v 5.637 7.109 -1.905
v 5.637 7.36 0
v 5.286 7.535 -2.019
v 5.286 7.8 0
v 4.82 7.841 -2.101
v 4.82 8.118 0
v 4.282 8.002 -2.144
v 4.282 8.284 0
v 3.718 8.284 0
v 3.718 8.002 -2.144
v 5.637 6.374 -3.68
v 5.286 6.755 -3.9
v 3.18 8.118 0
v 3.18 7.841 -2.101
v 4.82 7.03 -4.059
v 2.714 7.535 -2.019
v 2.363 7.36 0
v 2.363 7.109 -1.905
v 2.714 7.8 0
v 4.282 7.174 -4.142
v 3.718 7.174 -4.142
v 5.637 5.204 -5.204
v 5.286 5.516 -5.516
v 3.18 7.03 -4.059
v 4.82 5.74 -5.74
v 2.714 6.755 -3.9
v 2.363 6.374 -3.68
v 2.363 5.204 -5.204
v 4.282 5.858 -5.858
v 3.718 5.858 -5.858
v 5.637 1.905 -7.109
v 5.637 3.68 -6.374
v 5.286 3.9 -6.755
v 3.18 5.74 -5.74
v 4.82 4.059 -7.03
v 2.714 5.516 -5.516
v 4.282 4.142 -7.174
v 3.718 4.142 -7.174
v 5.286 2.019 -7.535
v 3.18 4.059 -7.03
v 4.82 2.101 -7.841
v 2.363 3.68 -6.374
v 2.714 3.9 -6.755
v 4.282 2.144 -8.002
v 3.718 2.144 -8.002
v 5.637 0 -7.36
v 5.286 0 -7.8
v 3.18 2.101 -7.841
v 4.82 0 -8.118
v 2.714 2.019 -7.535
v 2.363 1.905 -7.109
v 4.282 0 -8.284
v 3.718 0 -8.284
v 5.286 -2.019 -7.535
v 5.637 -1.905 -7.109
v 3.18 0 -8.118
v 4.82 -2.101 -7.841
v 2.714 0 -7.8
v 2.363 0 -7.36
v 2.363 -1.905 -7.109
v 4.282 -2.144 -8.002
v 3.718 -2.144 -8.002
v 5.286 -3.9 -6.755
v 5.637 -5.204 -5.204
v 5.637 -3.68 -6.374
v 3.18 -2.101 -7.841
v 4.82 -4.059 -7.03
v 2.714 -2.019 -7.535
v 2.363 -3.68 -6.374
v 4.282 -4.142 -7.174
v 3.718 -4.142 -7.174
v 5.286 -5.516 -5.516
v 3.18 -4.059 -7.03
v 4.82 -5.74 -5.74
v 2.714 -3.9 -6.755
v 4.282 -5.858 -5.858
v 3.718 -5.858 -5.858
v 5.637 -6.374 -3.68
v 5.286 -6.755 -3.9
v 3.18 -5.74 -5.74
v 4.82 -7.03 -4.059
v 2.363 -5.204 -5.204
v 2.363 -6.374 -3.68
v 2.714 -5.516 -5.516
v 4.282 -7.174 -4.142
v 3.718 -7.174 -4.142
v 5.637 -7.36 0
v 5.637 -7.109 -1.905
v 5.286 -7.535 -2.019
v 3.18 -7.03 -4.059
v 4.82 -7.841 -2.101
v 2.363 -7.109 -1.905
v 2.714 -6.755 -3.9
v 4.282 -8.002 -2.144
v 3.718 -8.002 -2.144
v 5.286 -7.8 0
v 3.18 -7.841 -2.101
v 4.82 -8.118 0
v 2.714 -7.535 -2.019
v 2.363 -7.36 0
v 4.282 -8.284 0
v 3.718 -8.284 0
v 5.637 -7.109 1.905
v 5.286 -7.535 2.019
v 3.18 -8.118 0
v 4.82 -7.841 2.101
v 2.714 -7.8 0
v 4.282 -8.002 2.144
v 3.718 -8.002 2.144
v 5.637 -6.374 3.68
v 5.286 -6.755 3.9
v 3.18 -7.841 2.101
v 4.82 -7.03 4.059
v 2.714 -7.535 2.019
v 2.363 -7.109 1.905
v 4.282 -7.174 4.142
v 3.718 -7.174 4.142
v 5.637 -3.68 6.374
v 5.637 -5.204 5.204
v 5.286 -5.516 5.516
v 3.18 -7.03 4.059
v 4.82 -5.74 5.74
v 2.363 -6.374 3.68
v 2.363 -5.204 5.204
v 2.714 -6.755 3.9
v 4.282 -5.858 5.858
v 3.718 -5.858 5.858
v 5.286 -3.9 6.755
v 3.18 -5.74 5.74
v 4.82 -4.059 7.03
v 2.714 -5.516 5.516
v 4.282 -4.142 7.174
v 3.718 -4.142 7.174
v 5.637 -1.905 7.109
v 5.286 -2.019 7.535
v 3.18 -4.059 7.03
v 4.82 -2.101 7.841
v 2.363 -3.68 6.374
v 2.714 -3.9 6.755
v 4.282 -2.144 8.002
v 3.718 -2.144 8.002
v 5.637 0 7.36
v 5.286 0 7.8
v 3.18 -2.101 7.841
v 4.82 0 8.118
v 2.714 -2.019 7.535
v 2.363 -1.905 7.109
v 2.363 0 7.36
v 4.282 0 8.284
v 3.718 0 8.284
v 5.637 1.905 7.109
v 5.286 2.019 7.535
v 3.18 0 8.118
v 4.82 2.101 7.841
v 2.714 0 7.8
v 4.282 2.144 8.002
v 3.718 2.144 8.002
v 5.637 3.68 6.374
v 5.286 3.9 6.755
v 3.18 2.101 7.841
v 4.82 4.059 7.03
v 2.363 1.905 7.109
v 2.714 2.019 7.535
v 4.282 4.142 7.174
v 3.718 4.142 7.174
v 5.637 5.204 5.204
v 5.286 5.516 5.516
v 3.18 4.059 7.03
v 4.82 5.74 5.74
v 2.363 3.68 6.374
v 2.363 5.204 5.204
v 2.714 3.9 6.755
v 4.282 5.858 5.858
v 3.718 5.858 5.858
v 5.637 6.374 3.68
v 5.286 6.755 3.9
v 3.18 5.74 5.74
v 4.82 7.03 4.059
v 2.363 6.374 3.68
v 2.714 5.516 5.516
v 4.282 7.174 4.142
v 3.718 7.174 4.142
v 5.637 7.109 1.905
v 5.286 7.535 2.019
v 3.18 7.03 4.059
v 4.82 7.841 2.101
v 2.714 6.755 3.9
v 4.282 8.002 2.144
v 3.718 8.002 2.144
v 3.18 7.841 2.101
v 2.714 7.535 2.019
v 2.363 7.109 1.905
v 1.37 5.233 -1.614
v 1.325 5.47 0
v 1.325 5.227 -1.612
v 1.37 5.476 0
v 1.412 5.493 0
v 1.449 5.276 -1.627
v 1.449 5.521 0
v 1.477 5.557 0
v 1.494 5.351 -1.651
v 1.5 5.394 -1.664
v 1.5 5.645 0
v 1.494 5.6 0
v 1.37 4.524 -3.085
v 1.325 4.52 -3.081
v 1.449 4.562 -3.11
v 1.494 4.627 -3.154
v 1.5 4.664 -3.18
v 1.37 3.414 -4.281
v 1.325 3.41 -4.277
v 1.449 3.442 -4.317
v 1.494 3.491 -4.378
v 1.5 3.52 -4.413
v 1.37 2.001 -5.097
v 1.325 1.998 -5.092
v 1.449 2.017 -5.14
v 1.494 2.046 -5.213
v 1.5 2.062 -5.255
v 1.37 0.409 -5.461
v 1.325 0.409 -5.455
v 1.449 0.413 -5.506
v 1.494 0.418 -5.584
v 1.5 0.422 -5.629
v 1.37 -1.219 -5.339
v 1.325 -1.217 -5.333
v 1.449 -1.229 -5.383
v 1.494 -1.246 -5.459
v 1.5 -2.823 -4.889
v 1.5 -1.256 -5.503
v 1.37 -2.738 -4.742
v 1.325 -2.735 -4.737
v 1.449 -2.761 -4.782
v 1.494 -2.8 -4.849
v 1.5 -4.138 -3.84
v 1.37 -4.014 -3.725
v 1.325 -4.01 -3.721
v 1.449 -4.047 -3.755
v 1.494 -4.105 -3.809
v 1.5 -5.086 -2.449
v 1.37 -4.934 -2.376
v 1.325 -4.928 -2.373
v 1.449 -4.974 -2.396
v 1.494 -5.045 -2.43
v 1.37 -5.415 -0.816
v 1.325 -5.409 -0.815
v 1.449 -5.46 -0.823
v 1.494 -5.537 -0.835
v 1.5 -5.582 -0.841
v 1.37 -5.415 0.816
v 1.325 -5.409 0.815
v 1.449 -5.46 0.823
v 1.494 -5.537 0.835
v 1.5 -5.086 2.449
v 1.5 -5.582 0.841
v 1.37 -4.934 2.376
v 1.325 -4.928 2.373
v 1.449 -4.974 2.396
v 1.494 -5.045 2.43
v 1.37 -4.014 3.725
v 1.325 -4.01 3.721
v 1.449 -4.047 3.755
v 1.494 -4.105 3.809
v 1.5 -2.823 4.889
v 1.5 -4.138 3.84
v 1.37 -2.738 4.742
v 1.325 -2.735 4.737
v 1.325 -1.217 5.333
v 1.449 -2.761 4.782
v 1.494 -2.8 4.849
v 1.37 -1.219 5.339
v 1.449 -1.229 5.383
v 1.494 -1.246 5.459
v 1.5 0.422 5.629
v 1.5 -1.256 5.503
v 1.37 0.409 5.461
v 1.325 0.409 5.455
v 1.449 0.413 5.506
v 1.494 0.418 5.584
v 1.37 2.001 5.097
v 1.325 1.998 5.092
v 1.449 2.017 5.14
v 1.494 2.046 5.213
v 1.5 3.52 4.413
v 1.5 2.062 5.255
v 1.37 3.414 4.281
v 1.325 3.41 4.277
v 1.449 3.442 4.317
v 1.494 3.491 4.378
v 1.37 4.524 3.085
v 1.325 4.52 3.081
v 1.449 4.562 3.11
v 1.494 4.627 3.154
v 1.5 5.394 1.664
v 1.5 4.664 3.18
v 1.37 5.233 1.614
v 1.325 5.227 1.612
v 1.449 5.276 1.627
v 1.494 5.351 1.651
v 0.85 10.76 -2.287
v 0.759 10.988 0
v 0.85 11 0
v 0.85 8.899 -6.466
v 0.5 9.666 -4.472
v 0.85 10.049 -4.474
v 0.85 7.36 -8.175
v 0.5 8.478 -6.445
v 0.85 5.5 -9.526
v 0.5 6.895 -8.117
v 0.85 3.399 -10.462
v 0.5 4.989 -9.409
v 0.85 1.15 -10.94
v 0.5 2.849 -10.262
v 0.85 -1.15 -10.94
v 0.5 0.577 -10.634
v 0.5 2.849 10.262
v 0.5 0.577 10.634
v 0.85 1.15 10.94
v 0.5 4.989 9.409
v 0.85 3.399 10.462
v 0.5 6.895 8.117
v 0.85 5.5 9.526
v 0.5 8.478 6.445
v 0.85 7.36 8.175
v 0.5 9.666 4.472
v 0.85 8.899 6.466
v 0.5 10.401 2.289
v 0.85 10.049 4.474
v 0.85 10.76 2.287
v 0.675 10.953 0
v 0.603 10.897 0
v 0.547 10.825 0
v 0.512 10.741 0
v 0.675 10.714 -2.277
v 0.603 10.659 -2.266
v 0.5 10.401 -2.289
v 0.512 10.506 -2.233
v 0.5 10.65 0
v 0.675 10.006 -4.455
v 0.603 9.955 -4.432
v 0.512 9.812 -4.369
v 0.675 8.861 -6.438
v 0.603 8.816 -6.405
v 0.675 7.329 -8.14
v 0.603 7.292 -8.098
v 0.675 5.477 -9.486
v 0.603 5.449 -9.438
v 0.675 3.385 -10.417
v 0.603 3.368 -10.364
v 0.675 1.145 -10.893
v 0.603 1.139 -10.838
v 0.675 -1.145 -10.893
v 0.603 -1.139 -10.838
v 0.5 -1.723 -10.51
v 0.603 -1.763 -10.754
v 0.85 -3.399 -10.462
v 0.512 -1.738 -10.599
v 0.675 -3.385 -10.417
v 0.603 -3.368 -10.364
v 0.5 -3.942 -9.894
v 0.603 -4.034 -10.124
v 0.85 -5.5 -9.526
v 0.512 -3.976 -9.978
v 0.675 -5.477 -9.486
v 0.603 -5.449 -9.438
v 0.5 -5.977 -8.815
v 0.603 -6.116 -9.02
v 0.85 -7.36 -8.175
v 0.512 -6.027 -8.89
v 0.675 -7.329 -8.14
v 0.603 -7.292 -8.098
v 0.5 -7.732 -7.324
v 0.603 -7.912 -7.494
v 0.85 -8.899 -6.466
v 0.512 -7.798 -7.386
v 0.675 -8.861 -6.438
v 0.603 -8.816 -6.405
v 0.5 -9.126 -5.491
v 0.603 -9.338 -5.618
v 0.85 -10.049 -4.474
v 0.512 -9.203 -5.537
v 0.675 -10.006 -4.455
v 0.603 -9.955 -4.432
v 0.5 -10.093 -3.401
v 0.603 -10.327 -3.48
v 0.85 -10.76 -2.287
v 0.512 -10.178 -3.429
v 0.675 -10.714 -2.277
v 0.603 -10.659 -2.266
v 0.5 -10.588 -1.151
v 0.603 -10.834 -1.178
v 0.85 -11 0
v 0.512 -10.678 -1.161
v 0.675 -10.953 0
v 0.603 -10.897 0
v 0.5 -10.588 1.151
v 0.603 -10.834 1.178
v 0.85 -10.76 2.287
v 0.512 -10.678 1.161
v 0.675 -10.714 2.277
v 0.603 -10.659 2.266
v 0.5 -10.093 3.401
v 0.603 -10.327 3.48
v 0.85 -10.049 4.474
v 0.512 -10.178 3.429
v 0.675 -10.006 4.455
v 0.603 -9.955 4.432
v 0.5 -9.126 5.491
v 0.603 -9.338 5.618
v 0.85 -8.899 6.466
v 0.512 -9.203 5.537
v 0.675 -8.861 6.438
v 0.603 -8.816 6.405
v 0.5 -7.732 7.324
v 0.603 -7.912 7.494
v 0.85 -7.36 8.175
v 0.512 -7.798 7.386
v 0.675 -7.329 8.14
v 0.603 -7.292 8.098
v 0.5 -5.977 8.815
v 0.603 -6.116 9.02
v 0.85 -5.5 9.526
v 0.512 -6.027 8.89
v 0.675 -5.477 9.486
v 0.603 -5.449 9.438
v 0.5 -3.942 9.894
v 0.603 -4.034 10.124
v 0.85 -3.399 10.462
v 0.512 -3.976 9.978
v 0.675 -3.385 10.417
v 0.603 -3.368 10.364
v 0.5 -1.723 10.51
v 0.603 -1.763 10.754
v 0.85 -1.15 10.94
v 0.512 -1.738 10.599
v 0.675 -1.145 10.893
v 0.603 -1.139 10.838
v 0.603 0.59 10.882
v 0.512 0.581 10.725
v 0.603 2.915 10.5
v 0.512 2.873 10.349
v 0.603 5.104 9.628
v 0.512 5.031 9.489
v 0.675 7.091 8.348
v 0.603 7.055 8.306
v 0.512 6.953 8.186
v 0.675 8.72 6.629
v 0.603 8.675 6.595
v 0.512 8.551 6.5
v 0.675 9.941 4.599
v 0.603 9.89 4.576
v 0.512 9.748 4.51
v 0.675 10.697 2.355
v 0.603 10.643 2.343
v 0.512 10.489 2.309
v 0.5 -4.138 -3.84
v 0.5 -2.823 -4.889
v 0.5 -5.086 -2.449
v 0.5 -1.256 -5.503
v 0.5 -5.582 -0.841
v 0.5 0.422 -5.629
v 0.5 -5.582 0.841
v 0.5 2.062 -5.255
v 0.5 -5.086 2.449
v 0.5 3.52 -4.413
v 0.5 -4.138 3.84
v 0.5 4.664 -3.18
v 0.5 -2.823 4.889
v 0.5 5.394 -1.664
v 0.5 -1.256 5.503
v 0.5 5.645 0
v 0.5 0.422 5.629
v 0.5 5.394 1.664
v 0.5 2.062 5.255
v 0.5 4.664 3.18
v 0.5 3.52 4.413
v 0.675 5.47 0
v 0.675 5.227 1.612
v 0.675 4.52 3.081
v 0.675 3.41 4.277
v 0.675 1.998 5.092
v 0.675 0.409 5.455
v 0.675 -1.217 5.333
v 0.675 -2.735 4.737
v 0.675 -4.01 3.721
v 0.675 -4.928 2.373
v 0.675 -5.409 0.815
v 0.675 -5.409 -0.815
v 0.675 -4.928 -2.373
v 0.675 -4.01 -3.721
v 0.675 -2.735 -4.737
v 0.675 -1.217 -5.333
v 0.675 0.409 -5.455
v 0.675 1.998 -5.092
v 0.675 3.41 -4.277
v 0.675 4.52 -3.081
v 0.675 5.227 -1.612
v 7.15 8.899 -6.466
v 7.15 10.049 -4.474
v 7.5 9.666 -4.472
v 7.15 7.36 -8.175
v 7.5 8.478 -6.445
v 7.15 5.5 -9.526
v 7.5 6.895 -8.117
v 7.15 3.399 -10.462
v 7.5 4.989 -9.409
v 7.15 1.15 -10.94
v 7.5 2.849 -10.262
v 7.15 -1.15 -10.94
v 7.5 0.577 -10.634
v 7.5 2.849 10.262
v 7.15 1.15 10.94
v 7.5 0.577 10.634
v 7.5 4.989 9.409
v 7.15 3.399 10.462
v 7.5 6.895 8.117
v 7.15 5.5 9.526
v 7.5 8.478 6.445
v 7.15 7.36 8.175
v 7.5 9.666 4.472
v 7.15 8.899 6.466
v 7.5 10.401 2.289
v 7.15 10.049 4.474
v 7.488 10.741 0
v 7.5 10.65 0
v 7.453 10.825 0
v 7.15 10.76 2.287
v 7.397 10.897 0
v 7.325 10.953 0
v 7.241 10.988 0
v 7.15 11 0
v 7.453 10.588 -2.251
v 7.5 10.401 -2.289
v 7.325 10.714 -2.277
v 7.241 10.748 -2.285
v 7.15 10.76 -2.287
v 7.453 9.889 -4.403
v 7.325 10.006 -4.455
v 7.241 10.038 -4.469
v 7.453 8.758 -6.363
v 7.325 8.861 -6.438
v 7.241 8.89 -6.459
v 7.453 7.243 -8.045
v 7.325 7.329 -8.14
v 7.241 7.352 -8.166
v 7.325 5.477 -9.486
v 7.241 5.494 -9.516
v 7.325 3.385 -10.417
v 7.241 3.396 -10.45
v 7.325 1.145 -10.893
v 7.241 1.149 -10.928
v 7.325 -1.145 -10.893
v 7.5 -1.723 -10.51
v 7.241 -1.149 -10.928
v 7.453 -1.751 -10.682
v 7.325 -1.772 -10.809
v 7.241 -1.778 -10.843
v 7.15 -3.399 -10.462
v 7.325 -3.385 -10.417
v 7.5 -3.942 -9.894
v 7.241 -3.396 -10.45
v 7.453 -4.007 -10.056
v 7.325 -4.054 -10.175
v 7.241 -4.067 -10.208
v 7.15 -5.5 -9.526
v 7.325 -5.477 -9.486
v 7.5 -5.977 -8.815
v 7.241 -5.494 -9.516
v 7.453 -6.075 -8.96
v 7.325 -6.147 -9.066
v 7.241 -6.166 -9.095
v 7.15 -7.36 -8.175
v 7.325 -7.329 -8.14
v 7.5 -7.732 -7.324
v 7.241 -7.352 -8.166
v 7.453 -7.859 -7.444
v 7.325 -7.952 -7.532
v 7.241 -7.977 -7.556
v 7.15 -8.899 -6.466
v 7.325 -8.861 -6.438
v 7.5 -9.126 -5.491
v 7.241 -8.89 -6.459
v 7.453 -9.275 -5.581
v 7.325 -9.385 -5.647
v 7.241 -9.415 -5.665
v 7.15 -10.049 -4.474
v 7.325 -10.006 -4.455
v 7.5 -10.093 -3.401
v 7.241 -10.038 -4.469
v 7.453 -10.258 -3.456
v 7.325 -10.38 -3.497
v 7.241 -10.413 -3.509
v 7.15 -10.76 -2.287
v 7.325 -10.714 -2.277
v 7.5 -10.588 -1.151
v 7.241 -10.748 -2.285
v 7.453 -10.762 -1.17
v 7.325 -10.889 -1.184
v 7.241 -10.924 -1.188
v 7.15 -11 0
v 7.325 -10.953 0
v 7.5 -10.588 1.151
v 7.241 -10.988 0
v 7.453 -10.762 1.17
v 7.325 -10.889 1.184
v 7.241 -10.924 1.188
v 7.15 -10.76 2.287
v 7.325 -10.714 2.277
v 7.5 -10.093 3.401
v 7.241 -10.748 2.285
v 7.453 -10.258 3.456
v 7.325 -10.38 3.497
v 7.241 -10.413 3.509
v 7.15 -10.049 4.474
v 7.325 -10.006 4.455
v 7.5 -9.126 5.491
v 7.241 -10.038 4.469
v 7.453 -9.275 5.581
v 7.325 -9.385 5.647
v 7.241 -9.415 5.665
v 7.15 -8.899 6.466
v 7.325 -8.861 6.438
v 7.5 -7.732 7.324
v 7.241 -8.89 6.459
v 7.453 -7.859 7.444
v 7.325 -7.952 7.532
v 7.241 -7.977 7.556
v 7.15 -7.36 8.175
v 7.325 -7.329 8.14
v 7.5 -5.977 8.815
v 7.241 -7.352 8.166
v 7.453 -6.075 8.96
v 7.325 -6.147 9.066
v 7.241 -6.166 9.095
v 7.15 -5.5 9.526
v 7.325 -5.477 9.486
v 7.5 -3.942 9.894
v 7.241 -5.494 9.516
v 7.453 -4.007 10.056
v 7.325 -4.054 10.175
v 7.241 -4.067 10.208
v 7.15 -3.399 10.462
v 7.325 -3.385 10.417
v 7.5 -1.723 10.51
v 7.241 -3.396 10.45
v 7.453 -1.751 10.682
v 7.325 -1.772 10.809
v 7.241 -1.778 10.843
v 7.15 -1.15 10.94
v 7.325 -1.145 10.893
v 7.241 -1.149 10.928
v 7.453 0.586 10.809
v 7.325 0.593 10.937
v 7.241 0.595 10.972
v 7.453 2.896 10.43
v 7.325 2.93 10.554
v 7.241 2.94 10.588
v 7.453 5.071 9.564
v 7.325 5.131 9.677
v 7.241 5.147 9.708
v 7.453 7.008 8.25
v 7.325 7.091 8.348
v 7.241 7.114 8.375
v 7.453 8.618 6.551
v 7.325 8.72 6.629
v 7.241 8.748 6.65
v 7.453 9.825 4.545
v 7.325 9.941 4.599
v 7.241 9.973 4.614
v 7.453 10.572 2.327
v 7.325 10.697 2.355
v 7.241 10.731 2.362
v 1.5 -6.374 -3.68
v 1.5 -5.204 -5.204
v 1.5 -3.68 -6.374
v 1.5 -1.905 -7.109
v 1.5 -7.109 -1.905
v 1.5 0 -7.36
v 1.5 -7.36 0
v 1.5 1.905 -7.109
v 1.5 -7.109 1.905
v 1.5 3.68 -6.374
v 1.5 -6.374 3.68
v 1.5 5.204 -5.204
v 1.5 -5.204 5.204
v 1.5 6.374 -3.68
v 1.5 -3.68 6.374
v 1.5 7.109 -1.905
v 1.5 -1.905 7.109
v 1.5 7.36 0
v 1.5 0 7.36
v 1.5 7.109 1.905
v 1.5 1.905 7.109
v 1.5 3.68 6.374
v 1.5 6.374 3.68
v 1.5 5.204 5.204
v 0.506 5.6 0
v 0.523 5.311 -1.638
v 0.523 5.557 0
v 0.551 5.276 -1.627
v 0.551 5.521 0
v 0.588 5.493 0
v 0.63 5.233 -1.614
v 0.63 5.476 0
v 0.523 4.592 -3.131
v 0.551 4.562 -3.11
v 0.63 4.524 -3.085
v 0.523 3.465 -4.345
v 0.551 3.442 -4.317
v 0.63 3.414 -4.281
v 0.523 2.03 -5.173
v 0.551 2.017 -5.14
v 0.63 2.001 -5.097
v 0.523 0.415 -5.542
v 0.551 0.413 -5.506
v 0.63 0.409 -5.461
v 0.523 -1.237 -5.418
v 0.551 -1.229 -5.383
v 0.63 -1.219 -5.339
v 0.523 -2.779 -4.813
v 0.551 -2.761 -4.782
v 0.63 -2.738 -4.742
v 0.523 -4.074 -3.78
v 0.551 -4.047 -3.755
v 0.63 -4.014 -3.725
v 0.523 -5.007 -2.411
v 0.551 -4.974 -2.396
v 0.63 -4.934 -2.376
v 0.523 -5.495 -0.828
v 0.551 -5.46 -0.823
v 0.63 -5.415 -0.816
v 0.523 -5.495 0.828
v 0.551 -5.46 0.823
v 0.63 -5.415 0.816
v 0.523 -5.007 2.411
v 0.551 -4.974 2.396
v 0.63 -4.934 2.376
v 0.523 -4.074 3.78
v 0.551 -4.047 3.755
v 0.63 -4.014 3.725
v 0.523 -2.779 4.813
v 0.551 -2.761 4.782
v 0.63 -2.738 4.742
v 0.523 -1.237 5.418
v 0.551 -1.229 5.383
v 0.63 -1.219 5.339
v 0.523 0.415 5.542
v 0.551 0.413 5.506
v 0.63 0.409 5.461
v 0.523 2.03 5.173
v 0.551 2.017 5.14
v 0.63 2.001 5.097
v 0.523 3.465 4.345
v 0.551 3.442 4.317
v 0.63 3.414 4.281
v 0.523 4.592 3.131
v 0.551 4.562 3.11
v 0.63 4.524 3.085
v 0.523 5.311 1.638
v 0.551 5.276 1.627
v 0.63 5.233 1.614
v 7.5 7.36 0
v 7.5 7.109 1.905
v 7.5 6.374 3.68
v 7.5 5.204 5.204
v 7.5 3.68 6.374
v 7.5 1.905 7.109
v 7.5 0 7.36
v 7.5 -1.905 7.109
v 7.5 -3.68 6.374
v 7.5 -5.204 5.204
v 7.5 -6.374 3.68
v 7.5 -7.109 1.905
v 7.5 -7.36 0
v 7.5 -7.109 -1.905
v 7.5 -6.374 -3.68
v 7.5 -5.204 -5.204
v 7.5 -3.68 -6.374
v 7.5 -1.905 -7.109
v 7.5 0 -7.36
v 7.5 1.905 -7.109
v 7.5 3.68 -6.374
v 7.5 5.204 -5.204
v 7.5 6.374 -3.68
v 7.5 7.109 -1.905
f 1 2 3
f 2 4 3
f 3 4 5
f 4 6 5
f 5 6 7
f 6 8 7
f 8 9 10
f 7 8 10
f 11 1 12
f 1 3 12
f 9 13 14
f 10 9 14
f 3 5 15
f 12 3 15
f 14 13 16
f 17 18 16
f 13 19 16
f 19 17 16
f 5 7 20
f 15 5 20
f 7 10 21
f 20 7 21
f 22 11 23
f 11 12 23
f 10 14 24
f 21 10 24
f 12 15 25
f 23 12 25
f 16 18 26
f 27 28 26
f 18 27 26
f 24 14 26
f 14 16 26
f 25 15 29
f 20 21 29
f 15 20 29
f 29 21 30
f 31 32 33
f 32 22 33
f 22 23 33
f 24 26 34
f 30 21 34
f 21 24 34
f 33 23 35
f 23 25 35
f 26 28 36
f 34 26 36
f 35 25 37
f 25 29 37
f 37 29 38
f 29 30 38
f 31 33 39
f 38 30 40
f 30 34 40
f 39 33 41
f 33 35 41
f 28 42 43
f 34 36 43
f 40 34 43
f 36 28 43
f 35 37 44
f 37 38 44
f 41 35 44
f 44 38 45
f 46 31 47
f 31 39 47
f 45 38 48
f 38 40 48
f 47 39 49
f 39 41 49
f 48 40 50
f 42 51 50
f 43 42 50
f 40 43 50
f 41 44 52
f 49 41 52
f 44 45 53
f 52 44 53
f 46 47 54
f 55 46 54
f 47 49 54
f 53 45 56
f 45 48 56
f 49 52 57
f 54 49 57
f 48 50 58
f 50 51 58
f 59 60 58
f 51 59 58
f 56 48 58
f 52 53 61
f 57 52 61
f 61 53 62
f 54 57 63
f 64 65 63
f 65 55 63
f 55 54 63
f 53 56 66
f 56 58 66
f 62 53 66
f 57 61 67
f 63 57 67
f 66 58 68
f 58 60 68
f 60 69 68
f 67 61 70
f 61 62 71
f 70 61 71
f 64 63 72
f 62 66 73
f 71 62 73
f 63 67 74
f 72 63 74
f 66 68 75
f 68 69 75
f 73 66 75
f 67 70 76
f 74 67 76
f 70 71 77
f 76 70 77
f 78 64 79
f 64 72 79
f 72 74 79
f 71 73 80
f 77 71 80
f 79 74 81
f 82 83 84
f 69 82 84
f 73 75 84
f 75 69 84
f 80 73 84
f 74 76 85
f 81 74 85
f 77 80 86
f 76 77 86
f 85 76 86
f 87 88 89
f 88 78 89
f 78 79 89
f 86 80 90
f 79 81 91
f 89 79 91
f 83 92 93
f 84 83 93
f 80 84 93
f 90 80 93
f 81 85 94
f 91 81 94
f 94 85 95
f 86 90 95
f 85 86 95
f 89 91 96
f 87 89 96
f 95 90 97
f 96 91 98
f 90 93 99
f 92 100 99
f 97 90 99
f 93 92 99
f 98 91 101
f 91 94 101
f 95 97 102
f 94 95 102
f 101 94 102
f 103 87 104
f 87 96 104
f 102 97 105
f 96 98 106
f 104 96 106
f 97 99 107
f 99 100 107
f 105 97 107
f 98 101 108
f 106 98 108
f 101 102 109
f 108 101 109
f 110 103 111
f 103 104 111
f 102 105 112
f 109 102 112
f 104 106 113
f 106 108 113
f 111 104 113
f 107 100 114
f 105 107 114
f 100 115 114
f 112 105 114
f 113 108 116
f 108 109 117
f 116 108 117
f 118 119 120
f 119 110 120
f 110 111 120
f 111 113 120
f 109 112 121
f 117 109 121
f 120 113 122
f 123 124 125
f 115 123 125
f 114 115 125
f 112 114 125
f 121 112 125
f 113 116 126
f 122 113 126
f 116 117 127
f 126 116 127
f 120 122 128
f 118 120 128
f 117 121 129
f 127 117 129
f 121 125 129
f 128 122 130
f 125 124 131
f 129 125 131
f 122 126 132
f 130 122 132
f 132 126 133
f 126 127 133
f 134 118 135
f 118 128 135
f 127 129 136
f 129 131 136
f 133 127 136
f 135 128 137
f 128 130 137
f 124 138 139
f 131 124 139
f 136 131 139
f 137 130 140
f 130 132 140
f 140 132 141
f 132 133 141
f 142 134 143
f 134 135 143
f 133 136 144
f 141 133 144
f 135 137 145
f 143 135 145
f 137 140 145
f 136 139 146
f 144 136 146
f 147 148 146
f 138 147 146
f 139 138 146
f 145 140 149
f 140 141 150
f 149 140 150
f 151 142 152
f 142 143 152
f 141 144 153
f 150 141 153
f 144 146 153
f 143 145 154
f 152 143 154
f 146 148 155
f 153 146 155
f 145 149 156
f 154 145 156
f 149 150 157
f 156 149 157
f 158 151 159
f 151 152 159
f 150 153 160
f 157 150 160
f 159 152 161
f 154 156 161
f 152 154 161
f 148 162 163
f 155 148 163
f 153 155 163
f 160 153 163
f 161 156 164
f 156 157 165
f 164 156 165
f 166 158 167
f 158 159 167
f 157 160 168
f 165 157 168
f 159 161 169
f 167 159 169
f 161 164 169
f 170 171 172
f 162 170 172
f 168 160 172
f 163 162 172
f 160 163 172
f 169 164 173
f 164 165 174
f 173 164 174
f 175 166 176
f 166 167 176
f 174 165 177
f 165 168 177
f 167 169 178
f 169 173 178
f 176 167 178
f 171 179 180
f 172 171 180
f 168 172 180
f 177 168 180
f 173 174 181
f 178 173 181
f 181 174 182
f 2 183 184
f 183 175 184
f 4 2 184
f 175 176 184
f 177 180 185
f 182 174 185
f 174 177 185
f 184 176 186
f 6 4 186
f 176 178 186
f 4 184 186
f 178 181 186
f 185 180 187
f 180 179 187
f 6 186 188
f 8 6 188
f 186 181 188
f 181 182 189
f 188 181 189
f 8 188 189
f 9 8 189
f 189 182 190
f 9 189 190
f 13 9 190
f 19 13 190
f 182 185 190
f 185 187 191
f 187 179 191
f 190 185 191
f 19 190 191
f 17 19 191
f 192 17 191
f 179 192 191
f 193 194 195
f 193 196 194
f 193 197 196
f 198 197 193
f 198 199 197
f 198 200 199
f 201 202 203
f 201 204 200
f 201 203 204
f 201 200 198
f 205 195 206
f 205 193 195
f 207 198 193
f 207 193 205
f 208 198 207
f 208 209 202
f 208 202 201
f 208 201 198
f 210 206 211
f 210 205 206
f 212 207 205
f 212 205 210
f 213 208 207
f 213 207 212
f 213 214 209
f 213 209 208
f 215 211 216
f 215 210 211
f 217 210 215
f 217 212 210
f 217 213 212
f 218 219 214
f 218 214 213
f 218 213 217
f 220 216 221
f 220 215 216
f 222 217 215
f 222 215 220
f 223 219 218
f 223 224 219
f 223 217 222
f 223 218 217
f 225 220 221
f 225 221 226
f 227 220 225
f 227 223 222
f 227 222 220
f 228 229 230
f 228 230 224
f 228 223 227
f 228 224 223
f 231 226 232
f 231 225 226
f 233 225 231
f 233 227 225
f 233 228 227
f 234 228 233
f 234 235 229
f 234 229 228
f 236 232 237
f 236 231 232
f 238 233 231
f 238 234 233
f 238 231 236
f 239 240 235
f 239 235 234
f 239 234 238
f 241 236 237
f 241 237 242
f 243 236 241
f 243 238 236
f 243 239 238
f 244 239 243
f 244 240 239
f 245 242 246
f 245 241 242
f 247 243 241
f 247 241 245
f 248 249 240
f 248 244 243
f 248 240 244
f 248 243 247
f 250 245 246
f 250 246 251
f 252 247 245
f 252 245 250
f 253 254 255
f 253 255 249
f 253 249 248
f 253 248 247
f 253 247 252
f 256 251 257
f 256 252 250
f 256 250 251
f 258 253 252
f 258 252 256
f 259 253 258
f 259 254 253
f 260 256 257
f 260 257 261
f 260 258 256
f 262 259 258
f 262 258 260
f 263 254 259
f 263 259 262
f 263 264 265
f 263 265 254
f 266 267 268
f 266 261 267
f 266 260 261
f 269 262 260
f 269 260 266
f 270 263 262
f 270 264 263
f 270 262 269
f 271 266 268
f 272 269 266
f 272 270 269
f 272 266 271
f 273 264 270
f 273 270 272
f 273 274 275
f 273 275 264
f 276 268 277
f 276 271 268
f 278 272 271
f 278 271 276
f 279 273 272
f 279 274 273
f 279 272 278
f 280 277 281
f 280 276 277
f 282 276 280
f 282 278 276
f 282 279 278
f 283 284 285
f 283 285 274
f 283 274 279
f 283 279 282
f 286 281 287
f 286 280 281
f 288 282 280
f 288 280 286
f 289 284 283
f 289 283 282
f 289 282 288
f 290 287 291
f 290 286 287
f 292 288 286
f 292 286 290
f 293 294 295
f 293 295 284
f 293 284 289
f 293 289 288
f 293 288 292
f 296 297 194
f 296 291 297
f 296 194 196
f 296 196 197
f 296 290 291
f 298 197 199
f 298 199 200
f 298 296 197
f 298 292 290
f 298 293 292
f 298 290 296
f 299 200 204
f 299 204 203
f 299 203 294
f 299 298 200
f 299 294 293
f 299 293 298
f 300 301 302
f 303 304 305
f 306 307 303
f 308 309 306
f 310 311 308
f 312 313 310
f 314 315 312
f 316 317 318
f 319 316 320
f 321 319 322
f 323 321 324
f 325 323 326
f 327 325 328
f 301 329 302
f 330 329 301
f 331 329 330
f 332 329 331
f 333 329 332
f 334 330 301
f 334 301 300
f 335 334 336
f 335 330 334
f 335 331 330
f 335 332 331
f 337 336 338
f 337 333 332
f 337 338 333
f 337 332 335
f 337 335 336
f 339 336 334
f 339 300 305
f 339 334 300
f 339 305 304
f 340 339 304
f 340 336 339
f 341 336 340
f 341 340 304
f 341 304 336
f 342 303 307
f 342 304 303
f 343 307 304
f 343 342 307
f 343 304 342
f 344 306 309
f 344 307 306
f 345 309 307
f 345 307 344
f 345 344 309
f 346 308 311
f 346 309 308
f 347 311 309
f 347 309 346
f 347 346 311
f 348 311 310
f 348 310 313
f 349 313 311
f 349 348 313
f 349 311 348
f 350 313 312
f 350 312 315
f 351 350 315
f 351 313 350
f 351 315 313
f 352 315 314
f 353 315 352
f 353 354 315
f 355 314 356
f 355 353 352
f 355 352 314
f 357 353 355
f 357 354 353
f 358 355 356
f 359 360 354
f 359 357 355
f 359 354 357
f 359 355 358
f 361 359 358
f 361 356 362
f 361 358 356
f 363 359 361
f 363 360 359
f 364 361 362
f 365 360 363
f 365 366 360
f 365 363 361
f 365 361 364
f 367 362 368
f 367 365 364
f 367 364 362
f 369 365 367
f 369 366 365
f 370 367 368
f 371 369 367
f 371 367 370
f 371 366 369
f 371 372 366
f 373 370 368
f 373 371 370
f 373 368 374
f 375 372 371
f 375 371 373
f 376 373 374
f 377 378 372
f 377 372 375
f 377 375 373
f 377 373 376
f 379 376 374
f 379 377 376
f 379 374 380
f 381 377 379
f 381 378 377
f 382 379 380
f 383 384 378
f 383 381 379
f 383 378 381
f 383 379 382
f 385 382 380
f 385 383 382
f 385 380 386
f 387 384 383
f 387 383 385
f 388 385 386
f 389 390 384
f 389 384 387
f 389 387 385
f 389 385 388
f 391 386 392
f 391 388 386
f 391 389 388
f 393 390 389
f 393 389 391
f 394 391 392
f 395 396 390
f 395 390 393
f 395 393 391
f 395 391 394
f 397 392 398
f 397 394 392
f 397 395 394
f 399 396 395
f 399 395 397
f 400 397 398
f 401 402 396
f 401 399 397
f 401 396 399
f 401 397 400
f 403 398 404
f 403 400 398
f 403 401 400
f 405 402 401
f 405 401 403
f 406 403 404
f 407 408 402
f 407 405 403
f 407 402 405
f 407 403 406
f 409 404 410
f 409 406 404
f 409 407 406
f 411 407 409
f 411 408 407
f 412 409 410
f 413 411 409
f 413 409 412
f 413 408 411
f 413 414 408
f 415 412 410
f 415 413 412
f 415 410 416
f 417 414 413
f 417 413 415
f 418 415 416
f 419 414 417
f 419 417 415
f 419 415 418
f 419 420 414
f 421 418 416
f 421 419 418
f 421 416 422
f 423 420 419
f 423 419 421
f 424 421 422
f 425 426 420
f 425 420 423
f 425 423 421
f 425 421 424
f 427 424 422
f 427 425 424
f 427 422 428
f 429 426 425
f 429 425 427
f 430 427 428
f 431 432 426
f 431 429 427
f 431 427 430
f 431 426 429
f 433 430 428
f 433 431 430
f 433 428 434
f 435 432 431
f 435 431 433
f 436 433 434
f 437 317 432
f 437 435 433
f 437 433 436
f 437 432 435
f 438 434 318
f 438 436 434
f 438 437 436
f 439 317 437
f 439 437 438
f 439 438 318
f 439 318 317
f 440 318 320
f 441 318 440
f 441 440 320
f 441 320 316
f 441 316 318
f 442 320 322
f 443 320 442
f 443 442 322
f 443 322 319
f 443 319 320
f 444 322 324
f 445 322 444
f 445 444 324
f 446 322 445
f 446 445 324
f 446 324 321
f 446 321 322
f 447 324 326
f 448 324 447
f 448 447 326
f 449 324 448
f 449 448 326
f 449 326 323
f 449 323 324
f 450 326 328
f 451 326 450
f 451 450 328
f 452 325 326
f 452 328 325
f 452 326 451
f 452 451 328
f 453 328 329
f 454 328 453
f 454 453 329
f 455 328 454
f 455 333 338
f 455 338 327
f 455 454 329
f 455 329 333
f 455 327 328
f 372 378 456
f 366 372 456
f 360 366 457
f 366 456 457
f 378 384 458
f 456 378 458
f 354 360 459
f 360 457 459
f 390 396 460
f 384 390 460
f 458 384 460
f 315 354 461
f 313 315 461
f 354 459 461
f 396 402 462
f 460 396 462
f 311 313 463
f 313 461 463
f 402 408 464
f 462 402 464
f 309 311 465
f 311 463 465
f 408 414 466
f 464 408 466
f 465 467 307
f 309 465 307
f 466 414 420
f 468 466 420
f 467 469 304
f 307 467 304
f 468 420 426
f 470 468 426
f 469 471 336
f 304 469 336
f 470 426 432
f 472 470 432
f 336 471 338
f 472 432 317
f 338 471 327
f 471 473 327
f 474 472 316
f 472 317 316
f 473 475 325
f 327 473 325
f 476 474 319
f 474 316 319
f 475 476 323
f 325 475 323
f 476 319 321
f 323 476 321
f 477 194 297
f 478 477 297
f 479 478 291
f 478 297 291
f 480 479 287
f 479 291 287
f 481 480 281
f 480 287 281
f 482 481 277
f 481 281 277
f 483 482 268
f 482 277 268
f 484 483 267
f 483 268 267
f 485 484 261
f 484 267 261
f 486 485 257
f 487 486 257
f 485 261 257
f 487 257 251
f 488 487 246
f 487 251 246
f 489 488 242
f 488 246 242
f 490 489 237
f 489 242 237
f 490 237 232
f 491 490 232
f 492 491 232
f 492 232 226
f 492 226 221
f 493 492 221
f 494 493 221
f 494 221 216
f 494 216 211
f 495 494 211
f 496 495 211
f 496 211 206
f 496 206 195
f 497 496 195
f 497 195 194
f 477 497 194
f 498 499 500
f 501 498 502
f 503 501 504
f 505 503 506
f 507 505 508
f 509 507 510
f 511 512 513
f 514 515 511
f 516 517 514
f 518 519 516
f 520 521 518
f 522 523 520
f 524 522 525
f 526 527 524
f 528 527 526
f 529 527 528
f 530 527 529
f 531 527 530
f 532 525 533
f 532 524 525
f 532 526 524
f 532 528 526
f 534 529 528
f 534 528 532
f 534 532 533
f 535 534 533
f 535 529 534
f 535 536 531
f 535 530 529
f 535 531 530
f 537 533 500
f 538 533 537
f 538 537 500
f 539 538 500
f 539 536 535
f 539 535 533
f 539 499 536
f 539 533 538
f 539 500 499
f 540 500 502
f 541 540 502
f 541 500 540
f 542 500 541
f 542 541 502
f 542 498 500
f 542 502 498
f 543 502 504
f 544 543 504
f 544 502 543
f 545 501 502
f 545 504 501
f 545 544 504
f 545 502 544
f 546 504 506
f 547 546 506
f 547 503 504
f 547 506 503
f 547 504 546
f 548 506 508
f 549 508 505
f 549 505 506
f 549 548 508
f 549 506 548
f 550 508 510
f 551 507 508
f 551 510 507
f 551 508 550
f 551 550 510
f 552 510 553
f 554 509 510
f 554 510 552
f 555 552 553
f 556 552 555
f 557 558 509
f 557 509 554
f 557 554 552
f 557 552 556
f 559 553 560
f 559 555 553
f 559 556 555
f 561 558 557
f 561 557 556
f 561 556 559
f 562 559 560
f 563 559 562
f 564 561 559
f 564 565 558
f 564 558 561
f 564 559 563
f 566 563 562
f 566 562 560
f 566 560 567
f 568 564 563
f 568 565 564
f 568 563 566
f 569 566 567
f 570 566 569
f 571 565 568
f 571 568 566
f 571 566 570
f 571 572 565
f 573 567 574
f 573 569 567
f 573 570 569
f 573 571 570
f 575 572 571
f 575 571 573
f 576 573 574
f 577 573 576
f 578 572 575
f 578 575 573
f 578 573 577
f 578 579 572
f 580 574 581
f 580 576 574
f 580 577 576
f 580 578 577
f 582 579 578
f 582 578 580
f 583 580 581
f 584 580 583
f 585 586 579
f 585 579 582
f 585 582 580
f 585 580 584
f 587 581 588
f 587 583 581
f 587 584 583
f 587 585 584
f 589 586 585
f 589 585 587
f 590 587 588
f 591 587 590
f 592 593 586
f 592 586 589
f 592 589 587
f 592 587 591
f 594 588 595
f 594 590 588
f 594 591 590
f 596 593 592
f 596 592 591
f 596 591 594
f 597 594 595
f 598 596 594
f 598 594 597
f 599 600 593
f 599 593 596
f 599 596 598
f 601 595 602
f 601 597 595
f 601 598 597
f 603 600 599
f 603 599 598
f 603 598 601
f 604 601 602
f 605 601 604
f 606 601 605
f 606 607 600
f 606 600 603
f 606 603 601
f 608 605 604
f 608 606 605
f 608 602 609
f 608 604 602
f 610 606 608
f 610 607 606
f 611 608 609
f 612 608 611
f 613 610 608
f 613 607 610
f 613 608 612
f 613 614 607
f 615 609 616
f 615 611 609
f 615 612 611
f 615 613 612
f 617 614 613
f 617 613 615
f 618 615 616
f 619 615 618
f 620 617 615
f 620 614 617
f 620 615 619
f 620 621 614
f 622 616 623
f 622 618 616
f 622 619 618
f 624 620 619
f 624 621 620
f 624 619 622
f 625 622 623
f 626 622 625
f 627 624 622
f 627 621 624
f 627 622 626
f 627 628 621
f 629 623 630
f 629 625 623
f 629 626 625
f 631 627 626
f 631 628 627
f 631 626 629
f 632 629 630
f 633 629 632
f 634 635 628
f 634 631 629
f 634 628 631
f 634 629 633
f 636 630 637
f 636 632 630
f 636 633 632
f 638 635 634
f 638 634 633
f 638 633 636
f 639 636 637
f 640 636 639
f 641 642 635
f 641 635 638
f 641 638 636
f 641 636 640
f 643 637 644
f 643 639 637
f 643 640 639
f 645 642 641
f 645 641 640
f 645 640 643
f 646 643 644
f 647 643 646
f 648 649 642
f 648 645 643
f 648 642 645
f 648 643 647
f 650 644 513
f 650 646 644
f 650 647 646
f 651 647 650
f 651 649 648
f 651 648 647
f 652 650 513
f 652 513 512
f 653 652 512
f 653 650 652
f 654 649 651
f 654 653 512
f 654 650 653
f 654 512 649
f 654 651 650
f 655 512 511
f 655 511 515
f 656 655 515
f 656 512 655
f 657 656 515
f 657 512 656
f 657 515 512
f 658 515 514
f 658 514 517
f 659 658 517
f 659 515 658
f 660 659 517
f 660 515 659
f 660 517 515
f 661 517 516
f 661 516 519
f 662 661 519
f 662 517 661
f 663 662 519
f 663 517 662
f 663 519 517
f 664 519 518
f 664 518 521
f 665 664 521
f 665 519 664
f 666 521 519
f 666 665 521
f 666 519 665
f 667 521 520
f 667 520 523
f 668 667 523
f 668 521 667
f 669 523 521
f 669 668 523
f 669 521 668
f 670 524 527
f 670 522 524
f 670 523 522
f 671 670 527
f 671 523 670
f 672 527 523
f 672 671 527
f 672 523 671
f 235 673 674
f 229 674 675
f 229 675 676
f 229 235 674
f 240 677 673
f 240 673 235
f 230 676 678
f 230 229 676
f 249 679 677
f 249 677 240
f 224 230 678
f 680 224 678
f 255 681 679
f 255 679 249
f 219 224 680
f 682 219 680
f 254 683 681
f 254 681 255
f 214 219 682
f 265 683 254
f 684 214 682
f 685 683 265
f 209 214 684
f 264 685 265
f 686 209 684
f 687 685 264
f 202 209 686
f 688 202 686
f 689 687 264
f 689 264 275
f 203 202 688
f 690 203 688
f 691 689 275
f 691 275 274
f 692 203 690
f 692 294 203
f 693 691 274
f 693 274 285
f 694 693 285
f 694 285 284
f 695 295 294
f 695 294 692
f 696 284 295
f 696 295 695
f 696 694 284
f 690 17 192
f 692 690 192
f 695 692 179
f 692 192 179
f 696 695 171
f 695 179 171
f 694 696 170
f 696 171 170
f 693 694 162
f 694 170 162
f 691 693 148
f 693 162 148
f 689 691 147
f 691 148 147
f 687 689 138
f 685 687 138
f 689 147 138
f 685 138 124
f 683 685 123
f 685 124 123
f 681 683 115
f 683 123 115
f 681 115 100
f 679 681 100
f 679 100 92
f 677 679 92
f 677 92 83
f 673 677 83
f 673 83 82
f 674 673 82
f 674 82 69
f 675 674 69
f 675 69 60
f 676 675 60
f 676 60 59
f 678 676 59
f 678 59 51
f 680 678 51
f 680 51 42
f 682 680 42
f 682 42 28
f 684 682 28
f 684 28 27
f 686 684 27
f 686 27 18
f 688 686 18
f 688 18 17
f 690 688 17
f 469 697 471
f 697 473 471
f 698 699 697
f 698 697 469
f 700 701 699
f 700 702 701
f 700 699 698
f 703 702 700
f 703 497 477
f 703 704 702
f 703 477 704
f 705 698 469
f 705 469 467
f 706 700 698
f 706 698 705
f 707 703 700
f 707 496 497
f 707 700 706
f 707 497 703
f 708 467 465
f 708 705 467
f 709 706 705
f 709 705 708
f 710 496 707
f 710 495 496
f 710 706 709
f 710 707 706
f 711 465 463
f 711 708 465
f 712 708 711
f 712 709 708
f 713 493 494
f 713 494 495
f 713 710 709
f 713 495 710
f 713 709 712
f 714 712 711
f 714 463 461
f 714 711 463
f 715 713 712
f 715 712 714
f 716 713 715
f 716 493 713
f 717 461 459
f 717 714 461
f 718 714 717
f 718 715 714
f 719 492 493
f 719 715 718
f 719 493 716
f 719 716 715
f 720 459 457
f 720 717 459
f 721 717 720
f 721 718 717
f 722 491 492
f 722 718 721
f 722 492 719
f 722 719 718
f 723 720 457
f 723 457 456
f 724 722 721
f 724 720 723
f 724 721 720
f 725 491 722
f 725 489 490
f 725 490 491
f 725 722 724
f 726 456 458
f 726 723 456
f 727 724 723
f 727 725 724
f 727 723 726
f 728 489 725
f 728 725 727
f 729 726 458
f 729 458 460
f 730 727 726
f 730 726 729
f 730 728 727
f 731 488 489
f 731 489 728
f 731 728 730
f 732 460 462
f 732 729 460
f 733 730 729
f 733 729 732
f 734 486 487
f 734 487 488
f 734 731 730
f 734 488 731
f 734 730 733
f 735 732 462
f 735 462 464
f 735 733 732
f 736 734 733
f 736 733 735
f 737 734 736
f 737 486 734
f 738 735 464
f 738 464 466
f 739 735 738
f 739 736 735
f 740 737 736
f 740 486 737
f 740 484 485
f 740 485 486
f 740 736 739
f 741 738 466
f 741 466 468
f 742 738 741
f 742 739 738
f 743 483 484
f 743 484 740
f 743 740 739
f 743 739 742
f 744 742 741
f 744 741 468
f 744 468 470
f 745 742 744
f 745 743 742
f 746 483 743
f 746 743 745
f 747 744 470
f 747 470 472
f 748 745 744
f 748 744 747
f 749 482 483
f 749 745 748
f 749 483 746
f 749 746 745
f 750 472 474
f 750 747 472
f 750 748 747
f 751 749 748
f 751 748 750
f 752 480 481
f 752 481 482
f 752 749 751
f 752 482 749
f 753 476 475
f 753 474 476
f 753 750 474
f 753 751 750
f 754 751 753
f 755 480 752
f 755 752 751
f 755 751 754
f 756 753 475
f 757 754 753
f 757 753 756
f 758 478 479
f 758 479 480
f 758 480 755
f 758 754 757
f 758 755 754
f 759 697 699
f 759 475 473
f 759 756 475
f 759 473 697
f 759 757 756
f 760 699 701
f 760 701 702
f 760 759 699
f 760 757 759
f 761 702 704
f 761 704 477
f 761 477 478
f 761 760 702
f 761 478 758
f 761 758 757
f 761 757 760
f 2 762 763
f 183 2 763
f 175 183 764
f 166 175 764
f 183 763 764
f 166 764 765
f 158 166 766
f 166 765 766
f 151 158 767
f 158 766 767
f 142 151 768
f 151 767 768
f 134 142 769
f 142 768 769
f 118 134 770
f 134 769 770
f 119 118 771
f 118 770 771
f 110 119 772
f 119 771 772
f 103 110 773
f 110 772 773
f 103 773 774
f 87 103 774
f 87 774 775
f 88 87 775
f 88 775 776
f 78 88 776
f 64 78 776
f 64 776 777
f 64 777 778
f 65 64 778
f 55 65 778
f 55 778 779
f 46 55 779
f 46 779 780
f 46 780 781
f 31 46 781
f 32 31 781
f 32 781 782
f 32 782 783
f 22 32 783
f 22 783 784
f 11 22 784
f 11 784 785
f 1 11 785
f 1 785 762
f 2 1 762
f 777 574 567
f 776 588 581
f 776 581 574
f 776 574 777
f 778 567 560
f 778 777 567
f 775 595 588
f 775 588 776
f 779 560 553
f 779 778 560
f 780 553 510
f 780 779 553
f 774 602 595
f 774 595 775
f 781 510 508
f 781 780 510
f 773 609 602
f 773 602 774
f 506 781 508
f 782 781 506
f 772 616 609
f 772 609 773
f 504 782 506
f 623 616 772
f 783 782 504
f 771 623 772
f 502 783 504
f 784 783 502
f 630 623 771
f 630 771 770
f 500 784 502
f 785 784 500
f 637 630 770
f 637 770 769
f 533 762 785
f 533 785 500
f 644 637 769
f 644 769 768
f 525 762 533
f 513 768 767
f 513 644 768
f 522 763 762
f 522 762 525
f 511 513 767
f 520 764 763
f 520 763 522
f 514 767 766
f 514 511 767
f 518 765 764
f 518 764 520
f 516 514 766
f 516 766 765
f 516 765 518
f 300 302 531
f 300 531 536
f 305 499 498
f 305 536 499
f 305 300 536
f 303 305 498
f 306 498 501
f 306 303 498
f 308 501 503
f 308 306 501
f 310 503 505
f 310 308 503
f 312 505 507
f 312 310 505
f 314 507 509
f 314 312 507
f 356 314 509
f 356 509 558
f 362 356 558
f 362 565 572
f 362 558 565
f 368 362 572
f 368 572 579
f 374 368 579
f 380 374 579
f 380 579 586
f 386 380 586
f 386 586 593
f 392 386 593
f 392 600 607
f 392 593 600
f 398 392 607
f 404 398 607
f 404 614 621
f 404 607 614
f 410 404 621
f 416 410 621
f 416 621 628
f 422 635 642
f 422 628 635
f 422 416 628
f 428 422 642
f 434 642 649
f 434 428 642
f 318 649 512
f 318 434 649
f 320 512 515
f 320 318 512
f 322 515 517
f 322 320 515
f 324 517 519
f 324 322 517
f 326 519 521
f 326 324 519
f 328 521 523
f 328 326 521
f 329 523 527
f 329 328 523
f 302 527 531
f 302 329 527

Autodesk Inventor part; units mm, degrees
sketch "Sketch_2" plane through (0, 0, 0) normal (0, 0, 1) x (1, 0, 0)
  line L0 (7.15, 0) -> (0.85, 0)
  line L1 (0.5, 10.65) -> (0.5, 5.645)
  arc A0 (0.5, 5.645) -> (0.675, 5.47) centre (0.675, 5.645) ccw
  line L2 (0.675, 5.47) -> (1.325, 5.47)
  arc A1 (1.325, 5.47) -> (1.5, 5.645) centre (1.325, 5.645) ccw
  line L3 (1.5, 5.645) -> (1.5, 7.36)
  line L4 (1.5, 7.36) -> (2.3632, 7.36)
  arc A2 (5.6368, 7.36) -> (2.3632, 7.36) centre (4, 6.415) ccw
  line L5 (5.6368, 7.36) -> (7.5, 7.36)
  line L6 (7.5, 7.36) -> (7.5, 10.65)
  arc A3 (7.5, 10.65) -> (7.15, 11) centre (7.15, 10.65) ccw
  line L7 (7.15, 11) -> (0.85, 11)
  arc A4 (0.85, 11) -> (0.5, 10.65) centre (0.85, 10.65) ccw
revolve "Revolution1" add sketch "Sketch_2" angle 360 about axis through (7.15, 0, 0) along (1, 0, 0)
ref_plane "OR_Cage_XY" through (0, 0, 0) normal (1, 0, 0) x (0, 0, -1)
ref_plane "OR_Cage_YZ" through (0, 0, 0) normal (0, 0, -1) x (0, 1, 0)
ref_plane "OR_Cage_ZX" through (0, 0, 0) normal (0, 1, 0) x (1, 0, 0)
ref_plane "OR_IR_XY" through (0, 0, 0) normal (1, 0, 0) x (0, 0, -1)
ref_plane "OR_IR_YZ" through (0, 0, 0) normal (0, 0, -1) x (0, 1, 0)
ref_plane "OR_IR_ZX" through (0, 0, 0) normal (0, 1, 0) x (1, 0, 0)
ref_plane "OR_ball_1_XY" through (4, 6.415, 0) normal (1, 0, 0) x (0, 0, -1)
ref_plane "OR_ball_1_YZ" through (4, 6.415, 0) normal (0, 0, -1) x (0, 1, 0)
ref_plane "OR_ball_1_ZX" through (4, 6.415, 0) normal (0, 1, 0) x (1, 0, 0)
ref_plane "OR_ball_2_XY" through (4, 1.9823, 6.101) normal (1, 0, 0) x (0, 0, -1)
ref_plane "OR_ball_2_YZ" through (4, 1.9823, 6.101) normal (0, 0, -1) x (0, 1, 0)
ref_plane "OR_ball_2_ZX" through (4, 1.9823, 6.101) normal (0, 1, 0) x (1, 0, 0)
ref_plane "OR_ball_3_XY" through (4, -5.1898, 3.7706) normal (1, 0, 0) x (0, 0, -1)
ref_plane "OR_ball_3_YZ" through (4, -5.1898, 3.7706) normal (0, 0, -1) x (0, 1, 0)
ref_plane "OR_ball_3_ZX" through (4, -5.1898, 3.7706) normal (0, 1, 0) x (1, 0, 0)
ref_plane "OR_ball_4_XY" through (4, -5.1898, -3.7706) normal (1, 0, 0) x (0, 0, -1)
ref_plane "OR_ball_4_YZ" through (4, -5.1898, -3.7706) normal (0, 0, -1) x (0, 1, 0)
ref_plane "OR_ball_4_ZX" through (4, -5.1898, -3.7706) normal (0, 1, 0) x (1, 0, 0)
ref_plane "OR_ball_5_XY" through (4, 1.9823, -6.101) normal (1, 0, 0) x (0, 0, -1)
ref_plane "OR_ball_5_YZ" through (4, 1.9823, -6.101) normal (0, 0, -1) x (0, 1, 0)
ref_plane "OR_ball_5_ZX" through (4, 1.9823, -6.101) normal (0, 1, 0) x (1, 0, 0)
properties part number "040400DR-22-H4W(0_5)3_or_CPY"
